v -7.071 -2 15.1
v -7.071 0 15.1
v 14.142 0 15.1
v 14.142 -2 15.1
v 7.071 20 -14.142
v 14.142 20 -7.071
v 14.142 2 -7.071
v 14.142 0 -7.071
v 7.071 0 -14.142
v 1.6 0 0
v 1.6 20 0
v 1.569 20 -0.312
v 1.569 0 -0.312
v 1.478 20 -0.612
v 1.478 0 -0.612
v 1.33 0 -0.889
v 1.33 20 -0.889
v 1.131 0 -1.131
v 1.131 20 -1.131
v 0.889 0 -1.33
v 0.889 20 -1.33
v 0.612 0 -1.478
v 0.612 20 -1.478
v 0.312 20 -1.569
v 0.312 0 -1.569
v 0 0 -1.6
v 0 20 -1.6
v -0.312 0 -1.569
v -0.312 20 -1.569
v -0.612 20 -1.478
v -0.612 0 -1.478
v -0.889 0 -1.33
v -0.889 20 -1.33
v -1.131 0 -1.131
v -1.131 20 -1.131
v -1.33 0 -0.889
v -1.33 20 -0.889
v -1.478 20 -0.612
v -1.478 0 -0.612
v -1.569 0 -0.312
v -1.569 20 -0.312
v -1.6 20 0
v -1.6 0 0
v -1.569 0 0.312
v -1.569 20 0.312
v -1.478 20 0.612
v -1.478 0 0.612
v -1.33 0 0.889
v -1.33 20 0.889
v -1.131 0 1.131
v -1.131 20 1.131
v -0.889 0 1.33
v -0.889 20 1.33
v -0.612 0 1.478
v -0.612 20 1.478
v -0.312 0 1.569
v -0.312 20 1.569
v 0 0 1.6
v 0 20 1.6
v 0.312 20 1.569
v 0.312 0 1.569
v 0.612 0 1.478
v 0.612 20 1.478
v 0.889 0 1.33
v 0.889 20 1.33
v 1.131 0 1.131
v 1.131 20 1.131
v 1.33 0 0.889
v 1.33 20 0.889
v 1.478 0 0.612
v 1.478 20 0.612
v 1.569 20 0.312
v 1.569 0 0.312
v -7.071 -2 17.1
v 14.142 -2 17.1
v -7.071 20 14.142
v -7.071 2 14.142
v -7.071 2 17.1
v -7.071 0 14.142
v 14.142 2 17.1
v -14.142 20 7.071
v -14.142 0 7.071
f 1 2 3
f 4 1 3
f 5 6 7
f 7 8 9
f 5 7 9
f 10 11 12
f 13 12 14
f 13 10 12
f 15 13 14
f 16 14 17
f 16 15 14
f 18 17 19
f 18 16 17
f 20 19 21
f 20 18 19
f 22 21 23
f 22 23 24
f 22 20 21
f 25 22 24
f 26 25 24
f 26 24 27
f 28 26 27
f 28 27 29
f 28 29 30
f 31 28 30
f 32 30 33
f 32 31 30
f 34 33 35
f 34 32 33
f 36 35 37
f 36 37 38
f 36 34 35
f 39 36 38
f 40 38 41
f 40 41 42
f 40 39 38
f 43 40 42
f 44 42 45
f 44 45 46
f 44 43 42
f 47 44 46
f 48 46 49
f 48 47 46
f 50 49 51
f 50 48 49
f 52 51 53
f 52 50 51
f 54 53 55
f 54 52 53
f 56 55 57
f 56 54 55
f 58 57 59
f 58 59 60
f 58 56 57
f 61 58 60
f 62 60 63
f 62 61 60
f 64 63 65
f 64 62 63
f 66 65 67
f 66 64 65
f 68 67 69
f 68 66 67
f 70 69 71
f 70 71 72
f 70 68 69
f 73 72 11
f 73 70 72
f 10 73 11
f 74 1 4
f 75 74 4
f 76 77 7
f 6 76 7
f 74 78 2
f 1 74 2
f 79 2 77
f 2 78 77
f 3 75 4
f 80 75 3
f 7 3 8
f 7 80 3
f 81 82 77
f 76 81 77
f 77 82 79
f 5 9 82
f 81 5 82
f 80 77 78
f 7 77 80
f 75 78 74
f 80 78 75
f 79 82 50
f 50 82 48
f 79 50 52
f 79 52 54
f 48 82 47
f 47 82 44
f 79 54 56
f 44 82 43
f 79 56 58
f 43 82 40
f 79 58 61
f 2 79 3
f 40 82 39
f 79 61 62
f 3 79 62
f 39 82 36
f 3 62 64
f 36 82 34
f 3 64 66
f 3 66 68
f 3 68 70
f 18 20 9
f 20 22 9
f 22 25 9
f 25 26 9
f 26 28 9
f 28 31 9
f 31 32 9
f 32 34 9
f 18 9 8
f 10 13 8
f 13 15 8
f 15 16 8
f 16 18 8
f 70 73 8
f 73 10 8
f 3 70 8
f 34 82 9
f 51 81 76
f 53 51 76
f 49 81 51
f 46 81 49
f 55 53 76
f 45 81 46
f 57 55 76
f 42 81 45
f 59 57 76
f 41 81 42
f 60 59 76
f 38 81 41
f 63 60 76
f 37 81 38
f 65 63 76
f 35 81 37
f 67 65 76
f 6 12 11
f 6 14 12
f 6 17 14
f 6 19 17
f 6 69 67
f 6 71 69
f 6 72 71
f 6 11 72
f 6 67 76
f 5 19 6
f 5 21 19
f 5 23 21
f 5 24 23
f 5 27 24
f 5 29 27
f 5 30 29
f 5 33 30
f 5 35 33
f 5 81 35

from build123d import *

# Parameters (mm, degrees)
SKETCH1_R                = 1.6
BOSS_EXTRUDE1_DEPTH      = 20
BOSS_EXTRUDE2_DEPTH      = 2
BOSS_EXTRUDE3_DEPTH      = 2
BOSS_EXTRUDE3_DEPTH_BACK = 2
SKETCH1_4_W              = 21.213203436
SKETCH1_4_H              = 2


with BuildPart() as part:
    # Sketch1 → Boss-Extrude1 (new body)
    with BuildSketch(Plane(origin=(0, 0, 0), x_dir=(1, 0, 0), z_dir=(0, 1, 0))):
        Polygon((-14.142135624, -7.071067812), (-7.071067812, -14.142135624), (14.142135624, 7.071067812), (7.071067812, 14.142135624), align=None)
        Circle(SKETCH1_R, mode=Mode.SUBTRACT)
    extrude(amount=BOSS_EXTRUDE1_DEPTH)

    # Sketch1<3> → Boss-Extrude2 (add)
    with BuildSketch(Plane(origin=(0, 0, 0), x_dir=(1, 0, 0), z_dir=(0, 1, 0))):
        Polygon((14.142135624, 7.071067812), (-7.071067812, -14.142135624), (-7.071067812, -15.1), (14.142135624, -15.1), align=None)
    extrude(amount=BOSS_EXTRUDE2_DEPTH)

    # Sketch1<4> → Boss-Extrude3 (add, two sides: drawn at the far end of the back side and taken through both)
    with BuildSketch(Plane(origin=(0, 0, 0), x_dir=(1, 0, 0), z_dir=(0, 1, 0)).offset(-BOSS_EXTRUDE3_DEPTH_BACK)):
        with Locations((3.535533906, -16.1)):
            Rectangle(SKETCH1_4_W, SKETCH1_4_H)
    extrude(amount=BOSS_EXTRUDE3_DEPTH + BOSS_EXTRUDE3_DEPTH_BACK)


solid = part.part
